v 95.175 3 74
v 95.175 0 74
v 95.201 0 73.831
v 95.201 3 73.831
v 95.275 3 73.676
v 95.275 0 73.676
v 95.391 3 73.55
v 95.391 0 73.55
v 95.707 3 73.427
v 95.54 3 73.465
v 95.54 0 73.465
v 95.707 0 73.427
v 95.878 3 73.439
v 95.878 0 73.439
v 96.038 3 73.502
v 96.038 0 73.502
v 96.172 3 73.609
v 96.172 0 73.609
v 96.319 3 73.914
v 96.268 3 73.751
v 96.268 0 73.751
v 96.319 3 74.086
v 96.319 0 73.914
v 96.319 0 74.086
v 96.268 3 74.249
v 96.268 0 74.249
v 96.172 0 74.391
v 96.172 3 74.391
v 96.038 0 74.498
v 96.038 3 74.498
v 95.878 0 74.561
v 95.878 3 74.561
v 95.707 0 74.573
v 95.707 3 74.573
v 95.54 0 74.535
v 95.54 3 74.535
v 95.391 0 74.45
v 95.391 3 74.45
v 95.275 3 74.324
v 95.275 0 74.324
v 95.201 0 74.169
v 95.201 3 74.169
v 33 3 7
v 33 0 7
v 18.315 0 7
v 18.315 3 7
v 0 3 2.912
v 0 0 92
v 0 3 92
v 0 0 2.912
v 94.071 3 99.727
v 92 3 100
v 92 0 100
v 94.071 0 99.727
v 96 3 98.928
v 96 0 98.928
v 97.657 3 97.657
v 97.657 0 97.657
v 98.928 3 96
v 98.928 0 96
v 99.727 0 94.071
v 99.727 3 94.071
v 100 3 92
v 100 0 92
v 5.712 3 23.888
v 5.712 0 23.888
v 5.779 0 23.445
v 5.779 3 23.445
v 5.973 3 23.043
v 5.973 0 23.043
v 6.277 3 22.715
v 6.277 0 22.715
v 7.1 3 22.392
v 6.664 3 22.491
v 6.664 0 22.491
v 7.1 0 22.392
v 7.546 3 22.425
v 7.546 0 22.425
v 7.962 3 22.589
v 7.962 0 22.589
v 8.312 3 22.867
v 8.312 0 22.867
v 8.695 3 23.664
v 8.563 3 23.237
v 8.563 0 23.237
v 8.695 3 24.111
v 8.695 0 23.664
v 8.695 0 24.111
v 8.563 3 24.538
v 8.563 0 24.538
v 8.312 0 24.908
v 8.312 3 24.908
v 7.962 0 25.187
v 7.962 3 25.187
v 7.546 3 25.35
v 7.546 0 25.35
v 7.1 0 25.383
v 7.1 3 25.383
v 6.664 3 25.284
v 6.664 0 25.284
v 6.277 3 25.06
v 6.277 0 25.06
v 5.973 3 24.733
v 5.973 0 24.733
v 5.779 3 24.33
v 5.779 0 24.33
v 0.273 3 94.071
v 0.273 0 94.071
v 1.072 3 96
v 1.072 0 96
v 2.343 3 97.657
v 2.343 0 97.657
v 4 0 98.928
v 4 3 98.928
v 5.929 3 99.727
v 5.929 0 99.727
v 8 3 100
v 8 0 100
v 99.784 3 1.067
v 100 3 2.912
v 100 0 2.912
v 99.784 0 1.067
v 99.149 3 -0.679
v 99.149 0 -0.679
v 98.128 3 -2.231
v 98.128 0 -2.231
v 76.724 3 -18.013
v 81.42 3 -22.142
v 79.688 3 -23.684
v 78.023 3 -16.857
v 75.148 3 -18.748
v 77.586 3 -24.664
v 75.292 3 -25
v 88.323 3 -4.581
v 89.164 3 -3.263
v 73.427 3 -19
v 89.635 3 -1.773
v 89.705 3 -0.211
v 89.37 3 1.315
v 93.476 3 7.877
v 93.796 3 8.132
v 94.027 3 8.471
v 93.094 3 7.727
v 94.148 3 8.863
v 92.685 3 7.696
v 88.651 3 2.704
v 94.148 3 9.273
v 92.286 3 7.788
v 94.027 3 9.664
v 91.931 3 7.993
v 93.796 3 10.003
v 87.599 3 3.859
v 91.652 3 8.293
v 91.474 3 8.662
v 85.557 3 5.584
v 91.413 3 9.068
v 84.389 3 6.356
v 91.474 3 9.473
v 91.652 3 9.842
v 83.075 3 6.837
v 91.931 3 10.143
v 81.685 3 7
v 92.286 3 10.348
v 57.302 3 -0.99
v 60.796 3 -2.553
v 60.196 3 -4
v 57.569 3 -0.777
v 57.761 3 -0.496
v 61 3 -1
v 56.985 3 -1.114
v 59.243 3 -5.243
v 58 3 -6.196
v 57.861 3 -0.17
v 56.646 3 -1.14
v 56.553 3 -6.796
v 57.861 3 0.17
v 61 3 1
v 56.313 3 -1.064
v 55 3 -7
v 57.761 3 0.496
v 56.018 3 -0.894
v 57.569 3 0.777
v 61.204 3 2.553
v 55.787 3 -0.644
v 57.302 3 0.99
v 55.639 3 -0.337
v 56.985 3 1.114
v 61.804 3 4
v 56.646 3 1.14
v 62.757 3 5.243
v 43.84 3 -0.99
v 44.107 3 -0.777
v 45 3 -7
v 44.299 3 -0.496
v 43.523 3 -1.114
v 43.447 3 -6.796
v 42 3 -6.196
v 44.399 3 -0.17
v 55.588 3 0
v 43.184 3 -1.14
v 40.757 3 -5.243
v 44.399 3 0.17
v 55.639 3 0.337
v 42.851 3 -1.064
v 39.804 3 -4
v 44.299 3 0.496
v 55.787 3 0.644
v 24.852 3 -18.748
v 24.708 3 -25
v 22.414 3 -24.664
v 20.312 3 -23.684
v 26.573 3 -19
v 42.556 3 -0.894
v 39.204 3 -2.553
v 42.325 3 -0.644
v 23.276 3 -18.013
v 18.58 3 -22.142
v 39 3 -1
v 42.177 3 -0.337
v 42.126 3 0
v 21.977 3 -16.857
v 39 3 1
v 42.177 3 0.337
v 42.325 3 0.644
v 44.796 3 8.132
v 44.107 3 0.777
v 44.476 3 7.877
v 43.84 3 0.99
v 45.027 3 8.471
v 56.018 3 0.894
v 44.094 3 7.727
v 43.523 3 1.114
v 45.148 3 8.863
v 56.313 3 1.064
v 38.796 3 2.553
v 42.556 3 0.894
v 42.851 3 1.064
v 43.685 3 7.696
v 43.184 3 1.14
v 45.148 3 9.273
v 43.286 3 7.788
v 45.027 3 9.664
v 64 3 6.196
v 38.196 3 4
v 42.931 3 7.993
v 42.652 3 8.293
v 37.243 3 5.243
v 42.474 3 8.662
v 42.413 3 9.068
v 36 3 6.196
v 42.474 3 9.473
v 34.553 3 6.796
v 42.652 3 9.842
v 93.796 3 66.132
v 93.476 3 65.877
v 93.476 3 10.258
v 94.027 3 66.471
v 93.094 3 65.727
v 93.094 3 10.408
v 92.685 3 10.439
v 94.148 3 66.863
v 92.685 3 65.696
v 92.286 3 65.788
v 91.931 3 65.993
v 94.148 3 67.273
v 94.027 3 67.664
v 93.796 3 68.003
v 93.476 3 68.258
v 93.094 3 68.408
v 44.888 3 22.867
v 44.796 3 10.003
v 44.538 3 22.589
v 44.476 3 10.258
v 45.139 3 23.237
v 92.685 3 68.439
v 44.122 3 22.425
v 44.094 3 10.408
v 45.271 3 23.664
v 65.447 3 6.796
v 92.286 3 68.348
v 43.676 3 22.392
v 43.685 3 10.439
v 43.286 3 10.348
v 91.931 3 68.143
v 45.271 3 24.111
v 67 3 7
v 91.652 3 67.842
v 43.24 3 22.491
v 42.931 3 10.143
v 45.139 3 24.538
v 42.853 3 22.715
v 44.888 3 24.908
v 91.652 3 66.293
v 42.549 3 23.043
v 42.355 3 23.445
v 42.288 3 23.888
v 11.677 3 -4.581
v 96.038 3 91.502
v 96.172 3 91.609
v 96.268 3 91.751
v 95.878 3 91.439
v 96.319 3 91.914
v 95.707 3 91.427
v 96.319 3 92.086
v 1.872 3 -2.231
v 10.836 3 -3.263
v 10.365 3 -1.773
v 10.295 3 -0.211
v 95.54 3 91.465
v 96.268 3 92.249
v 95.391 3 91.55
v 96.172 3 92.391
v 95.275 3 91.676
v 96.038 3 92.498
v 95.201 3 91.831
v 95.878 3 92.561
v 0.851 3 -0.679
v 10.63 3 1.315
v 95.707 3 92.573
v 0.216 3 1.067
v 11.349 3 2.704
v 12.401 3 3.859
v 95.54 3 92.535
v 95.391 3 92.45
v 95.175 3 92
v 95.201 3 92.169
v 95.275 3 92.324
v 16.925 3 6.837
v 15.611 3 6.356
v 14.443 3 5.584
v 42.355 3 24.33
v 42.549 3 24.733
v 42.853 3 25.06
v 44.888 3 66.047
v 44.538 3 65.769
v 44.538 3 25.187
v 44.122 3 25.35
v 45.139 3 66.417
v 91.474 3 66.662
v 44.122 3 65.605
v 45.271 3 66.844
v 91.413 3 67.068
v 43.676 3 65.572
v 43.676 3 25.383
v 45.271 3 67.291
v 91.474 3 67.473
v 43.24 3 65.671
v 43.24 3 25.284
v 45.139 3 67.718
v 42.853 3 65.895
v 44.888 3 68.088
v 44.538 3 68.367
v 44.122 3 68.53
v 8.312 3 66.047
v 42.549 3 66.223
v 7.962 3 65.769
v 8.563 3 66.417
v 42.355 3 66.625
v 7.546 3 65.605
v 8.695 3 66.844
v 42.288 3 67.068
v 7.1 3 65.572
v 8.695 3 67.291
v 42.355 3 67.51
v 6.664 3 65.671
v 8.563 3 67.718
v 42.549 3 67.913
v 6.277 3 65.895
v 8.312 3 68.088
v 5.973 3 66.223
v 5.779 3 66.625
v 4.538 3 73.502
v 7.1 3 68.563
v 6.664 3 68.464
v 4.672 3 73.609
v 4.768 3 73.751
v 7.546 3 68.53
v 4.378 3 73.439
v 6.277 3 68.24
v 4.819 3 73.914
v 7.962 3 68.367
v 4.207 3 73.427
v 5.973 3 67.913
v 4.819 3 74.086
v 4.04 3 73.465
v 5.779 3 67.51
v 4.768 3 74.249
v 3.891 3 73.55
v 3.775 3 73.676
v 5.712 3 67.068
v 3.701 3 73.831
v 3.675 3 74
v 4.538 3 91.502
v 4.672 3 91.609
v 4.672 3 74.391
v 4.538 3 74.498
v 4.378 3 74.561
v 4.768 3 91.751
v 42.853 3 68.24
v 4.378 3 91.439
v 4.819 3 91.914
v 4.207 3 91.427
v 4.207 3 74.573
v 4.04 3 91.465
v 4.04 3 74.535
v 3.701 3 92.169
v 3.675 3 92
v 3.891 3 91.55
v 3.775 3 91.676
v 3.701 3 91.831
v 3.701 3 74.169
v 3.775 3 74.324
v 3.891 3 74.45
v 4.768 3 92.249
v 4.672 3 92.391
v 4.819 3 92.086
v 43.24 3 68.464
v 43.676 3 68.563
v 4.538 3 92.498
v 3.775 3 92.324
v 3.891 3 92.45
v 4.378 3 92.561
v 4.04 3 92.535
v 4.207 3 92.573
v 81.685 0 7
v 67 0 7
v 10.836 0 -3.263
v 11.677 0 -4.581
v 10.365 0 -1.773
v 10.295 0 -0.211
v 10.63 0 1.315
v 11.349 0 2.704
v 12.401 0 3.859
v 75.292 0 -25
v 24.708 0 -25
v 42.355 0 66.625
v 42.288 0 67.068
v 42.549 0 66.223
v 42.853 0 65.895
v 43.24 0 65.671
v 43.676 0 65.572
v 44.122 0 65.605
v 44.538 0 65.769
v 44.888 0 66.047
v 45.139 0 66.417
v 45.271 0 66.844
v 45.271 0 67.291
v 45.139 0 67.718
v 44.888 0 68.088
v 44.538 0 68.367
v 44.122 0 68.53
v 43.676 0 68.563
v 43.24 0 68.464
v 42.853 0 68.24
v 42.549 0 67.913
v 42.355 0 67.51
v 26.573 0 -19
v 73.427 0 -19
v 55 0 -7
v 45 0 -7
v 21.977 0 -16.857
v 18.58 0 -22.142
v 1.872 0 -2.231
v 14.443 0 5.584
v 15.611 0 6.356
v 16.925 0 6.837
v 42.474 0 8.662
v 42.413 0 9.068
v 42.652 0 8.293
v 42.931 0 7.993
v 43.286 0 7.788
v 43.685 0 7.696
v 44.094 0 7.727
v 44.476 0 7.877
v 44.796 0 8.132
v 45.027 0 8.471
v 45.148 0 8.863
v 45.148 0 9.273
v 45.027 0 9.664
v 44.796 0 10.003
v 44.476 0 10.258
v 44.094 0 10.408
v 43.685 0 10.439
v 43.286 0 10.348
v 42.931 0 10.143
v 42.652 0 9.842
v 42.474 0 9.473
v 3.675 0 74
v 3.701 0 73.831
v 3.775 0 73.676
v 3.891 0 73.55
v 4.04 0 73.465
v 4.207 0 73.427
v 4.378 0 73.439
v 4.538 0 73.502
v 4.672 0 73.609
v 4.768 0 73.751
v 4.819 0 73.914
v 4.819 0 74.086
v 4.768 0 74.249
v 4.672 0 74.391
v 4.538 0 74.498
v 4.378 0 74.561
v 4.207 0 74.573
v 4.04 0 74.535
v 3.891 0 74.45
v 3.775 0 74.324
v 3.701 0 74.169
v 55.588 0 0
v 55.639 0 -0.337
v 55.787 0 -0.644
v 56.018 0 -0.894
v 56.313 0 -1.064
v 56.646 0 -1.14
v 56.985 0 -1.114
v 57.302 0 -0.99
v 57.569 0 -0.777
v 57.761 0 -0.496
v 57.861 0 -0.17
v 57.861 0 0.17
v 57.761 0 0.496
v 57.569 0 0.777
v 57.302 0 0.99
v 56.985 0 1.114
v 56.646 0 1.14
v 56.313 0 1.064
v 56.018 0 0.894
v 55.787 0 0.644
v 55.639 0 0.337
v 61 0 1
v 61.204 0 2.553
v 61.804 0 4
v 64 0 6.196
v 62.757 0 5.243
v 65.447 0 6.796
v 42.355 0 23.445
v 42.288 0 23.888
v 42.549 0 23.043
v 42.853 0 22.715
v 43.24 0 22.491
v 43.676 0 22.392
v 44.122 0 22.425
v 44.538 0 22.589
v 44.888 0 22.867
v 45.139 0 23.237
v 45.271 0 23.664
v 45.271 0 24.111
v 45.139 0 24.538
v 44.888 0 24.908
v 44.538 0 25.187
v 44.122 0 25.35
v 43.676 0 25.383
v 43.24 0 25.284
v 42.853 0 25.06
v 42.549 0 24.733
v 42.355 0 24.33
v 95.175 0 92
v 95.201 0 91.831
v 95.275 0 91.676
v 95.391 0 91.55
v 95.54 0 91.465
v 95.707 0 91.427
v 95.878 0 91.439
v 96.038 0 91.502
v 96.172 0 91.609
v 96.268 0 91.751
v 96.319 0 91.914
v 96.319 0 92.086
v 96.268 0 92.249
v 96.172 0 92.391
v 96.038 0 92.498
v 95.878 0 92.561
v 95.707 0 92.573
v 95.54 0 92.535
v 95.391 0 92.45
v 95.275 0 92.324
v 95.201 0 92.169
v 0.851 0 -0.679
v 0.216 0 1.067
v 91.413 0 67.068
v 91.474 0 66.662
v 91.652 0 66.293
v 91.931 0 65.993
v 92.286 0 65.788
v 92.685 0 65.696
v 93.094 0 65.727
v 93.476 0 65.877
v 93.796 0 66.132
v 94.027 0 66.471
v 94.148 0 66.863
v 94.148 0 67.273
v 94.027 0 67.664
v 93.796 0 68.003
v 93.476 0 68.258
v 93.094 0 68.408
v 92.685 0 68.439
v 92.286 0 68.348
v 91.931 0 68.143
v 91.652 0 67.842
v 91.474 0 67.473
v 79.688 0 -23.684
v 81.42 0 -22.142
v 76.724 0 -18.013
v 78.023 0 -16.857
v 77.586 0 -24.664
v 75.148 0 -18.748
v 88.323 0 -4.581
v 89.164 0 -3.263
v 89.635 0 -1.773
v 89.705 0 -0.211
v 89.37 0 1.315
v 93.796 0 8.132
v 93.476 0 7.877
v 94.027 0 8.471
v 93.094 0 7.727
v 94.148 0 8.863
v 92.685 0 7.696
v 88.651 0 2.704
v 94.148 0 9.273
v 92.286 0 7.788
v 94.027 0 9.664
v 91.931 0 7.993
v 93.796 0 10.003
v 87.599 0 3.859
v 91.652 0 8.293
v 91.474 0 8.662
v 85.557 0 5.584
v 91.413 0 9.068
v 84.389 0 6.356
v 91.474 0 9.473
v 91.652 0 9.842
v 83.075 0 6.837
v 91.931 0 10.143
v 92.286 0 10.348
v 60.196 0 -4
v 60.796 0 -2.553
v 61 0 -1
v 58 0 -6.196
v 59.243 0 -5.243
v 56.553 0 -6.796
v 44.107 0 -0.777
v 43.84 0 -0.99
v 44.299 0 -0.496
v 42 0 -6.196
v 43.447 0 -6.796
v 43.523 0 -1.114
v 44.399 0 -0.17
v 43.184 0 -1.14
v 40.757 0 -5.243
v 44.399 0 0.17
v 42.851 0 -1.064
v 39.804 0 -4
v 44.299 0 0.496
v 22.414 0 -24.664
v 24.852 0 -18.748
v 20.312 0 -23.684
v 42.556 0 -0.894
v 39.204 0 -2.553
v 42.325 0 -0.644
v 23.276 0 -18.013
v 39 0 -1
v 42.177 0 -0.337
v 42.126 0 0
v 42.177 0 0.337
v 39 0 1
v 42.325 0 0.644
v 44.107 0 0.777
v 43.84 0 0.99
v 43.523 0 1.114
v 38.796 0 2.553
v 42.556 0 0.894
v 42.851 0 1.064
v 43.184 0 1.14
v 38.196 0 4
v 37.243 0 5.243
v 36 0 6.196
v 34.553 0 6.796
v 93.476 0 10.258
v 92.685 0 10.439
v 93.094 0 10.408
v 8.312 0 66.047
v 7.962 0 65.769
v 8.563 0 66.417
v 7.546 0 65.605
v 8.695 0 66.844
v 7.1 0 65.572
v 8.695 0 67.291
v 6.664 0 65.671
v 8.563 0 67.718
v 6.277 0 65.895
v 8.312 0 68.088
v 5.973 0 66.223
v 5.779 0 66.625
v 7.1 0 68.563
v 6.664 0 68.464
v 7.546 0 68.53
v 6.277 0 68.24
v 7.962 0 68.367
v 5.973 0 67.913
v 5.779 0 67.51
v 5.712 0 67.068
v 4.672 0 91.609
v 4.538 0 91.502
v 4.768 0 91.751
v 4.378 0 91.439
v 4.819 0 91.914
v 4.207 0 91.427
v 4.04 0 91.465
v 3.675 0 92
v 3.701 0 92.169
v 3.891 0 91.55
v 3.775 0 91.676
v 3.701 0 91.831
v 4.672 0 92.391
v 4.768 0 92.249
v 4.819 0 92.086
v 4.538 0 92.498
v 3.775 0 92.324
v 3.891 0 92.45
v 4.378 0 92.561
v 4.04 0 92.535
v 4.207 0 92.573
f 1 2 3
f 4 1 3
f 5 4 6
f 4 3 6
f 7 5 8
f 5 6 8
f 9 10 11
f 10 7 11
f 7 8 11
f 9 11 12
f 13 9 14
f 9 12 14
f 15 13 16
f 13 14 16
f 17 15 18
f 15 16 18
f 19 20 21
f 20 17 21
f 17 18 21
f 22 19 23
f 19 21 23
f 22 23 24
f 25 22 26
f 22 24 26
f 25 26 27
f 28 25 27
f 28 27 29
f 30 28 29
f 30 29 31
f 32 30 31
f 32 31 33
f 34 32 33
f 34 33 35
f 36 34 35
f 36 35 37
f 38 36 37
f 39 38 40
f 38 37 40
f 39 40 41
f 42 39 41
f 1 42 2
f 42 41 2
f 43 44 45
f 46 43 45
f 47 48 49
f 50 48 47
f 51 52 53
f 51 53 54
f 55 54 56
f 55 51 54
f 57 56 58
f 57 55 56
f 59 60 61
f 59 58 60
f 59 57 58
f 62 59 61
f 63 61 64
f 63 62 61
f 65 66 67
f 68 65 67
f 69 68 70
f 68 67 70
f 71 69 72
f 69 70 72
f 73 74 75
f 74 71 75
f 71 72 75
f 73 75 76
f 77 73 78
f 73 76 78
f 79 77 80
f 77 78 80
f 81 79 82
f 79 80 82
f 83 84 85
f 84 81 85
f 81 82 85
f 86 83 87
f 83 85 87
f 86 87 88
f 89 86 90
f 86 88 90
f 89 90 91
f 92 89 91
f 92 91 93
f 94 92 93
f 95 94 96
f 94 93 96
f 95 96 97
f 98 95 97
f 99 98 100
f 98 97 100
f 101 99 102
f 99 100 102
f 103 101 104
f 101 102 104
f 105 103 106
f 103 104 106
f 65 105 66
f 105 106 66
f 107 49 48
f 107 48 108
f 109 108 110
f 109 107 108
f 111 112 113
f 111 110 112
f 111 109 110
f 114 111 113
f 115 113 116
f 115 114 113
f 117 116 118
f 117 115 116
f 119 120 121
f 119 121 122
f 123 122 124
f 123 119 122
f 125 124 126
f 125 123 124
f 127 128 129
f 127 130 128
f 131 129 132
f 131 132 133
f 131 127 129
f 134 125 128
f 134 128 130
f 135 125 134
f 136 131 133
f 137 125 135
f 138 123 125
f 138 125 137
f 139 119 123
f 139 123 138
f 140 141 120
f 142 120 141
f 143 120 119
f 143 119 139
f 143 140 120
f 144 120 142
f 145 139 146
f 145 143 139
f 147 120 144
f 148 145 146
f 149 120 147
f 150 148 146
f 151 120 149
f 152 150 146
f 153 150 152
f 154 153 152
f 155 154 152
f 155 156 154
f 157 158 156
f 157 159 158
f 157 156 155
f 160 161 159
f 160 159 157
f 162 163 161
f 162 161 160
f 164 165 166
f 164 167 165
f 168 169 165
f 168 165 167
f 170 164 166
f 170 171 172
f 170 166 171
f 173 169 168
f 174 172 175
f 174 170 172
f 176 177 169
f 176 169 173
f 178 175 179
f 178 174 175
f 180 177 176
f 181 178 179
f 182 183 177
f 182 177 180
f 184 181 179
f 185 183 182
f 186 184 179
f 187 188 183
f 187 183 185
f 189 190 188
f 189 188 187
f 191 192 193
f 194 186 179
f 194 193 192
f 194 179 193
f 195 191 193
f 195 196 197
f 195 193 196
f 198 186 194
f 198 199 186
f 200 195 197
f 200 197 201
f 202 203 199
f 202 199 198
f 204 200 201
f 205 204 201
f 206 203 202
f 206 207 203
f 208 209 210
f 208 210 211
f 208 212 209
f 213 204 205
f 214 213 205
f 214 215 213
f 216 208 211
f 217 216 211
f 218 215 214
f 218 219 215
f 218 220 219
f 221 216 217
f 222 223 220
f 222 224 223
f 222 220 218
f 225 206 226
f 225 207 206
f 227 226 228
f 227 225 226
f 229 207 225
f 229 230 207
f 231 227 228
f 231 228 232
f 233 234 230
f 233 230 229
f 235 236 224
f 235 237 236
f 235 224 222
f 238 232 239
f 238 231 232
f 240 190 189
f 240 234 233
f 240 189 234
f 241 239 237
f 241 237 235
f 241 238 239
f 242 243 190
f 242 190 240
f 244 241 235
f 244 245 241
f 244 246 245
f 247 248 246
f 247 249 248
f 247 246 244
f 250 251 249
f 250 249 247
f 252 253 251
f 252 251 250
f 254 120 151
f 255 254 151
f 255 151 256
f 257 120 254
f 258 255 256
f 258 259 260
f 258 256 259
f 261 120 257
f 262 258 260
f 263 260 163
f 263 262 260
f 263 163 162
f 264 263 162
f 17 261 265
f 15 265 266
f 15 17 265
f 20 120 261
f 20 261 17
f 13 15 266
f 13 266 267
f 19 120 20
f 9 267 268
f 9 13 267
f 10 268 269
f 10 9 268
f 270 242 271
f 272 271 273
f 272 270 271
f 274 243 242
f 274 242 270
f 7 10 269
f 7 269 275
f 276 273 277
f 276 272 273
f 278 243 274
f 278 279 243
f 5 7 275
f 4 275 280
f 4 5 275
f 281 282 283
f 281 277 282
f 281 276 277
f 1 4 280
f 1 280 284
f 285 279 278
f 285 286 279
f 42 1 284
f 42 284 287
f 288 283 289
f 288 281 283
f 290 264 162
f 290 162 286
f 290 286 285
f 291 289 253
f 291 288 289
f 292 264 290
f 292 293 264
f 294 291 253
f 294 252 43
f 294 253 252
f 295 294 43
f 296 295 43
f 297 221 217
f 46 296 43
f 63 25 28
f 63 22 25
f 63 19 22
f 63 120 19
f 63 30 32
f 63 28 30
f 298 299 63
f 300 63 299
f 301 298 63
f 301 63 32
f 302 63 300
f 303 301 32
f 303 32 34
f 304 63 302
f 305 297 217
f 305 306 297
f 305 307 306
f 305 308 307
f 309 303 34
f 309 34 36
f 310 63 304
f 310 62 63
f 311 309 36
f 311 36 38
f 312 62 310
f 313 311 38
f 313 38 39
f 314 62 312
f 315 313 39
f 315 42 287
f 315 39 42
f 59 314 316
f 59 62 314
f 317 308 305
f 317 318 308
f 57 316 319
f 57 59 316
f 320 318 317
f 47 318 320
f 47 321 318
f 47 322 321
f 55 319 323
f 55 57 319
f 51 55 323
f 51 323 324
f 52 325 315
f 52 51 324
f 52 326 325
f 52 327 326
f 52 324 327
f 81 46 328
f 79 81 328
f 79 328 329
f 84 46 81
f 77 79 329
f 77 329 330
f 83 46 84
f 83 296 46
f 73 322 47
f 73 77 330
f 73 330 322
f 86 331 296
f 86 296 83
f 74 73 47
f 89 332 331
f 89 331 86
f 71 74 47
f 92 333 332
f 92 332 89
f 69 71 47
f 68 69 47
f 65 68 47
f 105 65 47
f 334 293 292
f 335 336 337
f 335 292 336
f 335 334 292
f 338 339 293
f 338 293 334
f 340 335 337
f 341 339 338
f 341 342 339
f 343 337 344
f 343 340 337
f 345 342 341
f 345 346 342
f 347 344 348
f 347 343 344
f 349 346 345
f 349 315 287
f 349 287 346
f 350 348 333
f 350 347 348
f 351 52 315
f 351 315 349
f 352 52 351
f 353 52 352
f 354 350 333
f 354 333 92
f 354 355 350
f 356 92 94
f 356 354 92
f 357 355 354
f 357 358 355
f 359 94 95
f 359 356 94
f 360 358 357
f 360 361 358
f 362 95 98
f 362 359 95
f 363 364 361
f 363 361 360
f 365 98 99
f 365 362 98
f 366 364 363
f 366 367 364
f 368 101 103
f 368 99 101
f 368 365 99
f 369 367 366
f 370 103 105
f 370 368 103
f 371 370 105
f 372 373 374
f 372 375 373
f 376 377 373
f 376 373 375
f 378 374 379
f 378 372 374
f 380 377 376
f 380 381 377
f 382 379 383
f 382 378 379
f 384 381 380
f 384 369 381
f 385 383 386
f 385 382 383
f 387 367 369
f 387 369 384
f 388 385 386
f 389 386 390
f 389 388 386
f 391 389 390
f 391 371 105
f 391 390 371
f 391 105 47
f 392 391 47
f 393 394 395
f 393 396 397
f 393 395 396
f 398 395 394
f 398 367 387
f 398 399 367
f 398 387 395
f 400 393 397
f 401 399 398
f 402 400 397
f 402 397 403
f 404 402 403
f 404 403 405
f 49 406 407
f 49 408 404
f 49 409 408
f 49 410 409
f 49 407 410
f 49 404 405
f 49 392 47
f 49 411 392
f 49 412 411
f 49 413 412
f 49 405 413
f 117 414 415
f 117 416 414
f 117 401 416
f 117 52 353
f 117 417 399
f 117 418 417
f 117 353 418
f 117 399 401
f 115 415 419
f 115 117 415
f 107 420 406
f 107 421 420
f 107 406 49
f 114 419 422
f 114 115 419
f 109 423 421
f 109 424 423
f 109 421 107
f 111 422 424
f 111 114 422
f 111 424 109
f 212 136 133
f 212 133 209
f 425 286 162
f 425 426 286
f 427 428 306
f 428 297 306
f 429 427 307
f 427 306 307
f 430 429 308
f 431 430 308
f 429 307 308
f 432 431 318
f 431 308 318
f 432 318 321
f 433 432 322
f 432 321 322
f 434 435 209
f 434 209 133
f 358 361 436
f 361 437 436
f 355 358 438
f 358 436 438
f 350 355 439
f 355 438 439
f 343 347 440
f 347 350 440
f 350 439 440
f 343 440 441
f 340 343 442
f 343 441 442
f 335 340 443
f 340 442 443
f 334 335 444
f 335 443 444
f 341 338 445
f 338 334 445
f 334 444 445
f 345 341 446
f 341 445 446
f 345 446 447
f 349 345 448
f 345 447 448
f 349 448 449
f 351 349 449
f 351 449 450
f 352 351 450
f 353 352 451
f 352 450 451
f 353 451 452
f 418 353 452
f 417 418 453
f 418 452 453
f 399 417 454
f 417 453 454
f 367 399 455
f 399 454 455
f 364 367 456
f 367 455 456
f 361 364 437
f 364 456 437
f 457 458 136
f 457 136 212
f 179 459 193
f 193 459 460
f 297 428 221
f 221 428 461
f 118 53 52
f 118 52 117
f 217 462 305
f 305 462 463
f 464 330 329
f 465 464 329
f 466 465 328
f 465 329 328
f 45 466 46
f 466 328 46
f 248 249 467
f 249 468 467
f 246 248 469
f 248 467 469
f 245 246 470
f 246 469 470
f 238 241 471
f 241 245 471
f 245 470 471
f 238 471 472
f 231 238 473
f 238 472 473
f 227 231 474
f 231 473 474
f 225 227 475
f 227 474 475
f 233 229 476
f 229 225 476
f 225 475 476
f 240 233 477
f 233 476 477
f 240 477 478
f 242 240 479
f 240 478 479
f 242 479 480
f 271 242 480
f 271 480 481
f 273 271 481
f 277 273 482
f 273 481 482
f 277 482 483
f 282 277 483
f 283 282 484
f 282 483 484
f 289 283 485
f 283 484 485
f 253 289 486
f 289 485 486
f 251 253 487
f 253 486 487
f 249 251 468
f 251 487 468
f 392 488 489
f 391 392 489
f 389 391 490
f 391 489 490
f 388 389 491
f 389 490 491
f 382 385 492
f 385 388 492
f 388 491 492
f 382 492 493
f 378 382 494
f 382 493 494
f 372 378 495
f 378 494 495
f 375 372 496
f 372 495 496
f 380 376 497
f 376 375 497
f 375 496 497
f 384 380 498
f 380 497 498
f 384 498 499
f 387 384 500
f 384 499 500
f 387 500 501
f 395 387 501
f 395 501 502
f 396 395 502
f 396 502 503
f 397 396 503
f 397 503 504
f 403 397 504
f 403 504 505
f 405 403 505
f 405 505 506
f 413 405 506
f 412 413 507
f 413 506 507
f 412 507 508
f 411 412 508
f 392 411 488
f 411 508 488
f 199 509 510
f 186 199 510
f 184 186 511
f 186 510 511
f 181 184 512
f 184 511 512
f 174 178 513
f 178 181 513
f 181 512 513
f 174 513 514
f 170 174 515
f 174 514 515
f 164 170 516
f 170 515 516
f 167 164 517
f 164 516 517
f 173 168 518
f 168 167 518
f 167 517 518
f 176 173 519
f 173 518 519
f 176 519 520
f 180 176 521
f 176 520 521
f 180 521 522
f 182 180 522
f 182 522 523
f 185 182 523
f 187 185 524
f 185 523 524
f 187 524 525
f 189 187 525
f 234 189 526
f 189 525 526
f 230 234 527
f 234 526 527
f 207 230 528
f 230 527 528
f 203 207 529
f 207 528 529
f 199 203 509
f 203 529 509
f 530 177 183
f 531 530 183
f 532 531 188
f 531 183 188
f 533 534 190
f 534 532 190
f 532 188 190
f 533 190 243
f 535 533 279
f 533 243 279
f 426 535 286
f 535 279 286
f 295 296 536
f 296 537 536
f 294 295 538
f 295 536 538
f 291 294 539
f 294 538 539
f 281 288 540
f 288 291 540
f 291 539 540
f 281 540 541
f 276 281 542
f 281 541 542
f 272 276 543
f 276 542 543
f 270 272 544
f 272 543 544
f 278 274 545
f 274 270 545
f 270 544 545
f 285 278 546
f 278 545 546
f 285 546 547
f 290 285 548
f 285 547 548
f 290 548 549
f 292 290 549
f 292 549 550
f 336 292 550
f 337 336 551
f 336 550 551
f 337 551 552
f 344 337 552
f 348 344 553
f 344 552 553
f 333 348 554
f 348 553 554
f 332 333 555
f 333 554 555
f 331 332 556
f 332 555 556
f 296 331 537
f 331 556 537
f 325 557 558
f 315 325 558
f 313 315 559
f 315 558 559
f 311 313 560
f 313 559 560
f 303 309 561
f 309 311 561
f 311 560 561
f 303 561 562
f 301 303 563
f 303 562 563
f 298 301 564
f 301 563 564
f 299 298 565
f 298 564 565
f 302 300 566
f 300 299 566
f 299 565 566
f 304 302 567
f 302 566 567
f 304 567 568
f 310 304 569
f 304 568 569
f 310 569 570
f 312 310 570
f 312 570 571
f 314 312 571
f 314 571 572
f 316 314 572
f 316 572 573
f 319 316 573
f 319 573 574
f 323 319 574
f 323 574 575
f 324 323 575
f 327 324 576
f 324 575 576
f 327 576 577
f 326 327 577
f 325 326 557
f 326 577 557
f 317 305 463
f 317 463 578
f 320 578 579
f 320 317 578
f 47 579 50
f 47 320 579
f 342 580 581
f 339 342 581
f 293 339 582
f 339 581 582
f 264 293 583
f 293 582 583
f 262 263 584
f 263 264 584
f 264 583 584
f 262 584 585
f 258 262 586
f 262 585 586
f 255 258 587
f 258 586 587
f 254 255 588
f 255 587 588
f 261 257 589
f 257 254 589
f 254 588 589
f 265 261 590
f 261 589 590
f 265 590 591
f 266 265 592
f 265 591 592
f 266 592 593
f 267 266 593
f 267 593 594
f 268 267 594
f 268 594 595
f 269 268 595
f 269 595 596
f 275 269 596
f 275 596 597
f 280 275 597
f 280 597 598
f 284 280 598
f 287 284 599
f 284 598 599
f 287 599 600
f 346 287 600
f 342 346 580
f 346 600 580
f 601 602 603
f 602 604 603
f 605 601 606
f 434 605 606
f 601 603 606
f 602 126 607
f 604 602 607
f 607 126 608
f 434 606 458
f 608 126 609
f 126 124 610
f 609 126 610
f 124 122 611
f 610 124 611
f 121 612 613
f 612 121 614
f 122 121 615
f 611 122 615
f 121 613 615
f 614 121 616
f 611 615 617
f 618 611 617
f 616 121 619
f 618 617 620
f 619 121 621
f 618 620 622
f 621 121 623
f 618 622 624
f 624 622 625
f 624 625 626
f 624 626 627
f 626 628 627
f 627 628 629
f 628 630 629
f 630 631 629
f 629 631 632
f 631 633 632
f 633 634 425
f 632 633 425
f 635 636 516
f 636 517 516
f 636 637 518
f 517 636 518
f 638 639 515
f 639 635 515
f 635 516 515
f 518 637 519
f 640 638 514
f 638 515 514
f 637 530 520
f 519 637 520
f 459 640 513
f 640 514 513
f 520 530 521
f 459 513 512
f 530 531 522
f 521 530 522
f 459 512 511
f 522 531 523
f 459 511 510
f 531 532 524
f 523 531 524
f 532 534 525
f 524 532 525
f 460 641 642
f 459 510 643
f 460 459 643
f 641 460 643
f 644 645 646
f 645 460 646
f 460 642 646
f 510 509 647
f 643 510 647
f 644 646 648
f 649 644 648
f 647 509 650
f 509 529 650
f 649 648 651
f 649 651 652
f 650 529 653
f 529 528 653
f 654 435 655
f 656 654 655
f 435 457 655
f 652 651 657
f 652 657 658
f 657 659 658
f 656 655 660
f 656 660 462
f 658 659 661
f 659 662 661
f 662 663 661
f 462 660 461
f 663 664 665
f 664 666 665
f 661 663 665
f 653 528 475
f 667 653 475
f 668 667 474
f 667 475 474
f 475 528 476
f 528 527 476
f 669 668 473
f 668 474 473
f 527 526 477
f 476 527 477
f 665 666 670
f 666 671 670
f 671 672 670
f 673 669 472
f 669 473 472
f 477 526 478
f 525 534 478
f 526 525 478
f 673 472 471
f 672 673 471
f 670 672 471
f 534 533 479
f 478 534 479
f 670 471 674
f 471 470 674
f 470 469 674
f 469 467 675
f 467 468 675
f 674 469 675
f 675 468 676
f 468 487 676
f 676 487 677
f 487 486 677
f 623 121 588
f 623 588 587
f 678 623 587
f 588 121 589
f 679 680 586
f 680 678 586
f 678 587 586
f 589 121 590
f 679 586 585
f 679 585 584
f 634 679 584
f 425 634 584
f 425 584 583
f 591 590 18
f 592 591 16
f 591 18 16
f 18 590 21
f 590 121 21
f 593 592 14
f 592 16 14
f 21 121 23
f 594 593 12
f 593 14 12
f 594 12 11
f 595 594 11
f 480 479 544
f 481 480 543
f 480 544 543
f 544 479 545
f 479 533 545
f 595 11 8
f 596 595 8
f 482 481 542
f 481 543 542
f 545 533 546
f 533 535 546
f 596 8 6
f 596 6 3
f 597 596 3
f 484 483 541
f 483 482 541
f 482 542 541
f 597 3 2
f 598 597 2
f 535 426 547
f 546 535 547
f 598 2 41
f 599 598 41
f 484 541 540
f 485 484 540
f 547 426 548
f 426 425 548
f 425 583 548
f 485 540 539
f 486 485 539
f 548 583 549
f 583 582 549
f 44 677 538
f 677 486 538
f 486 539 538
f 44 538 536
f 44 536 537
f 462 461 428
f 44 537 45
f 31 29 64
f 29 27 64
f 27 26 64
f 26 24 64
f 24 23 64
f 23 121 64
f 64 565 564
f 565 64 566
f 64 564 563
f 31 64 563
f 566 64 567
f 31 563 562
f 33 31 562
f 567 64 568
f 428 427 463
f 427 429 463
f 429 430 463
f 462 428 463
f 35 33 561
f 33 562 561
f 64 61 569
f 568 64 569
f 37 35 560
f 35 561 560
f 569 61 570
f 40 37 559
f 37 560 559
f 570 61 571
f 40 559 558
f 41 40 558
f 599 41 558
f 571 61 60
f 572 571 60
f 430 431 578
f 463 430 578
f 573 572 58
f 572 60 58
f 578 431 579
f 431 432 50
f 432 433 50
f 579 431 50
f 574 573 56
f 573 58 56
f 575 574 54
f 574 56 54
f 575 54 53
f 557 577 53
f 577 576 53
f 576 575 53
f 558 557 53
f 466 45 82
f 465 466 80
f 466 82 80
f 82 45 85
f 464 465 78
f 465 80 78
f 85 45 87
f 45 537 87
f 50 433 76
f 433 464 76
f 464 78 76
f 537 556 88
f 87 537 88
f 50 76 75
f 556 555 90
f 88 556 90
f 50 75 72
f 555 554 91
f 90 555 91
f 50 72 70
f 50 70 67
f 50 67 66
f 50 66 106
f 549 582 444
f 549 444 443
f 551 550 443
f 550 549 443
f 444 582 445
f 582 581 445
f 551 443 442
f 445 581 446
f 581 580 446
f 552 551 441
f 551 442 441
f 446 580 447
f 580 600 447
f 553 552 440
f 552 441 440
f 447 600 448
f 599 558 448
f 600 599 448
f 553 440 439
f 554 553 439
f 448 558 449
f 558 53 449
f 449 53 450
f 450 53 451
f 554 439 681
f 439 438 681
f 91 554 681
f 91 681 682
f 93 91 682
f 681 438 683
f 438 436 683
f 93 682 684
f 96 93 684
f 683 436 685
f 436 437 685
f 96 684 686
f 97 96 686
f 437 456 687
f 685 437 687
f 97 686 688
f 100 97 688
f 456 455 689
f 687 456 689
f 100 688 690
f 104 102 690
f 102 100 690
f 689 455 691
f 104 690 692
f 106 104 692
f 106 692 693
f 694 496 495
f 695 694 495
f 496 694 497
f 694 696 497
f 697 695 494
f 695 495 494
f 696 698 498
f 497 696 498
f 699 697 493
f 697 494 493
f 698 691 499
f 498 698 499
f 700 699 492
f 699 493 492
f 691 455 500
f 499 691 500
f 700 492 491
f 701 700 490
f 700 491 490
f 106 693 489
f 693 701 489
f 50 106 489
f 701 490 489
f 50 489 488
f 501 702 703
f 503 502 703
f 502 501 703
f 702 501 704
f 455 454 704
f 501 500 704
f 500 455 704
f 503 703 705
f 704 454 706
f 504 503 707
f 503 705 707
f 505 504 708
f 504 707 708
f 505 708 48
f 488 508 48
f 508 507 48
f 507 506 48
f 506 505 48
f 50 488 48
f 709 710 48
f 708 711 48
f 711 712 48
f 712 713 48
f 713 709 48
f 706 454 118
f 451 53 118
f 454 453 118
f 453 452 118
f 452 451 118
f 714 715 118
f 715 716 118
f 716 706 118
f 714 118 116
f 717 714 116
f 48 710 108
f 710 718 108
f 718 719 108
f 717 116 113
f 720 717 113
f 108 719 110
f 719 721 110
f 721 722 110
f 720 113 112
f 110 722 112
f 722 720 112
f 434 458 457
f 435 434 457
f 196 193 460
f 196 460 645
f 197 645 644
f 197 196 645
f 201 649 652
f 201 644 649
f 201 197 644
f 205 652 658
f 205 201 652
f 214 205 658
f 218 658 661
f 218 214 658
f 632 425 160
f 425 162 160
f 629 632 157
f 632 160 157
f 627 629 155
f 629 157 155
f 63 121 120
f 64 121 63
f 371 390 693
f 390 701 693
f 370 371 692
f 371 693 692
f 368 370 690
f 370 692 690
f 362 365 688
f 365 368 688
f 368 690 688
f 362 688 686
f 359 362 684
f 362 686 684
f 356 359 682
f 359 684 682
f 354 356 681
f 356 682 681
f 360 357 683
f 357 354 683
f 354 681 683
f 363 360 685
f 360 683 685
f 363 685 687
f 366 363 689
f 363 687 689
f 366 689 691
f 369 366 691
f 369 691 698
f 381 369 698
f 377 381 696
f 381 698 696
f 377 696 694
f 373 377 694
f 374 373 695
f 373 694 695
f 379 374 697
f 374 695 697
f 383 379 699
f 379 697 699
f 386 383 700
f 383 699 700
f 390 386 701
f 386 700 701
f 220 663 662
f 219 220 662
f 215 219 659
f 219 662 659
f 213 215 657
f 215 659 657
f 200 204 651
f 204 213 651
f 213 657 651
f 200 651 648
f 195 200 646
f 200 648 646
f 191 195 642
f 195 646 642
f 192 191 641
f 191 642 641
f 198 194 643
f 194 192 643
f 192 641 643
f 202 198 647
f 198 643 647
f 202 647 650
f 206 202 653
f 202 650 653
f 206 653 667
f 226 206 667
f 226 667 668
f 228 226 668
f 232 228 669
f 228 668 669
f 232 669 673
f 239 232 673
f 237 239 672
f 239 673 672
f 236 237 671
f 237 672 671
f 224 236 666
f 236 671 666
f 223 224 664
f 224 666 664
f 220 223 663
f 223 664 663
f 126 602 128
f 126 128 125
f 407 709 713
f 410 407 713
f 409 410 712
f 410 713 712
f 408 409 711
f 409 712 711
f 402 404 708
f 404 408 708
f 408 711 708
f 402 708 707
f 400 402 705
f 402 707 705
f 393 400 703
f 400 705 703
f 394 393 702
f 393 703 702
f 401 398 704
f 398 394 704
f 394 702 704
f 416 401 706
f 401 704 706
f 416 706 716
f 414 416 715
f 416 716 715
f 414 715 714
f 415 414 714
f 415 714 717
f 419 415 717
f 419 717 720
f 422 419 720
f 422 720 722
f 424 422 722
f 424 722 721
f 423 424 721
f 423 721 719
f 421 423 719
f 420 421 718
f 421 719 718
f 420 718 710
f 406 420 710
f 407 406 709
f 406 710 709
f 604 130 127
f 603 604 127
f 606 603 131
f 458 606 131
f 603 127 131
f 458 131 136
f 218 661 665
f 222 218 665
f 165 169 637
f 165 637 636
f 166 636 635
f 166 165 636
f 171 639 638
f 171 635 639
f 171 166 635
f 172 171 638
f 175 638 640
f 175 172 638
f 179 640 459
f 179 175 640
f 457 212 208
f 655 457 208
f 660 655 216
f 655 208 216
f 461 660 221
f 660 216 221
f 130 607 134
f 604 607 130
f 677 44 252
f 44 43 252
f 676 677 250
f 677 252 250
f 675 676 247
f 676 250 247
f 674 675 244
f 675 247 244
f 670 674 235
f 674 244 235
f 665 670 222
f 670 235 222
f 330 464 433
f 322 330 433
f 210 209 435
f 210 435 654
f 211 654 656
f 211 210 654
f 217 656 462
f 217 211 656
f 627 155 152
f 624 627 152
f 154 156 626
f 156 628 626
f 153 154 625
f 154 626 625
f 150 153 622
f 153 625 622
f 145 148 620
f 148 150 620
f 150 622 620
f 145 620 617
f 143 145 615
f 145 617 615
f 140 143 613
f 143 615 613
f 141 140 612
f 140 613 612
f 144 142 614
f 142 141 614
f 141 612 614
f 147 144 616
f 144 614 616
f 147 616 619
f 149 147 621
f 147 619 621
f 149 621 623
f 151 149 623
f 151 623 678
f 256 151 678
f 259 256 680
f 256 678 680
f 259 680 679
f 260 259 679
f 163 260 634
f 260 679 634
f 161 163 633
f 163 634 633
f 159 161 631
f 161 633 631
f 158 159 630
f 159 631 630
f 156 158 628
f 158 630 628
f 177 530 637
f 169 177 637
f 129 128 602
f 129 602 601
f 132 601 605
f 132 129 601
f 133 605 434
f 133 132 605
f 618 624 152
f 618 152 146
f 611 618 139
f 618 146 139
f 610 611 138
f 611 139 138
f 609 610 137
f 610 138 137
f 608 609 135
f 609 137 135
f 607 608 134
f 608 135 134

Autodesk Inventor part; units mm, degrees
ref_plane "YZ Plane" through (0, 0, 0) normal (1, 0, 0) x (0, 1, 0)
ref_plane "XZ Plane" through (0, 0, 0) normal (0, 1, 0) x (-1, 0, 0)
ref_plane "XY Plane" through (0, 0, 0) normal (0, 0, 1) x (1, 0, 0)
sketch "Sketch1" plane through (0, 0, 0) normal (0, 1, 0) x (-1, 0, 0)
  line L0 (0, 0) -> (-100, 0) construction
  line L1 (-100, 0) -> (-100, 100)
  line L2 (-100, 100) -> (0, 100)
  line L3 (0, 100) -> (0, 0)
  circle A0 centre (-4.25, 92) radius 0.575
  circle A1 centre (-4.25, 74) radius 0.575
  line L4 (-50, 100) -> (-50, 0) construction
  line L5 (-7.212, 23.8876) -> (-7.212, 67.0676) construction
  line L6 (-7.212, 67.0676) -> (-43.788, 67.0676) construction
  line L7 (-7.212, 23.8876) -> (-43.788, 23.8876) construction
  circle A2 centre (-7.212, 67.0676) radius 1.5
  circle A3 centre (-43.788, 67.0676) radius 1.5
  circle A4 centre (-7.212, 23.8876) radius 1.5
  circle A5 centre (-43.788, 23.8876) radius 1.5
  line L8 (-43.788, 9.0676) -> (-92.788, 9.0676) construction
  line L9 (-92.788, 9.0676) -> (-92.788, 67.0676) construction
  line L10 (-92.788, 67.0676) -> (-43.788, 67.0676) construction
  line L11 (-43.788, 67.0676) -> (-43.788, 9.0676) construction
  circle A6 centre (-43.788, 9.0676) radius 1.375
  circle A7 centre (-92.788, 9.0676) radius 1.375
  circle A8 centre (-92.788, 67.0676) radius 1.375
  circle A9 centre (-43.788, 67.0676) radius 1.375
  line L12 (-7.212, 45.4776) -> (0, 45.4776) construction
  line L13 (-92.788, 38.0676) -> (-100, 38.0676) construction
  circle A10 centre (-43.269, 0) radius 1.143
  line L14 (0, 0) -> (-100, 0) construction
  circle A11 centre (-95.75, 74) radius 0.575
  circle A12 centre (-56.731, 0) radius 1.143
  circle A13 centre (-95.75, 92) radius 0.575
  line L15 (-39, 7) -> (-61, 7)
  line L16 (-61, 7) -> (-61, -7)
  line L17 (-61, -7) -> (-39, -7)
  line L18 (-39, -7) -> (-39, 7)
  line L19 (-39, 7) -> (-61, -7) construction
  line L20 (-61, 7) -> (-39, -7) construction
  line L21 (-50, 0) -> (-50, -25) construction
  line L22 (-50, -25) -> (-20.9775, -25)
  line L23 (-20.9775, -25) -> (0, 0)
  line L24 (-7.8324, 0) -> (-23.7753, -19)
  line L25 (-23.7753, -19) -> (-50, -19)
  line L26 (-39, 7) -> (-16.1201, 7)
  line L27 (-16.1201, 7) -> (-7.8324, 0)
  line L28 (-50, -25) -> (-79.0225, -25)
  line L29 (-79.0225, -25) -> (-100, 0)
  line L30 (-92.1676, 0) -> (-76.2247, -19)
  line L31 (-76.2247, -19) -> (-50, -19)
  line L32 (-61, 7) -> (-83.8799, 7)
  line L33 (-83.8799, 7) -> (-92.1676, 0)
  line L34 (-30, 100) -> (-70, 100)
  point P0 (-50, 80)
  dimension "d0" = 100
  dimension "d1" = 100
  dimension "d2" = 8
  dimension "d3" = 4.25
  dimension "d4" = 1.15
  dimension "d5" = 18
  dimension "d6" = 43.18
  dimension "d7" = 36.576
  dimension "d8" = 3
  dimension "d9" = 49
  dimension "d10" = 58
  dimension "d15" = 2.75
  dimension "d16" = 13.462
  dimension "d17" = 2.286
  dimension "d33" = 22
  dimension "d34" = 25
  dimension "d36" = 130
  dimension "d37" = 6
  dimension "d38" = 6
  dimension "d39" = 14
extrude "Extrusion1" add sketch "Sketch1" along normal blind 3 contours L1 L2 L3 L23 L22 L28 L29 | L18 L17 L16 L15
fillet "Fillet1" radius 6 10 edges at (61, 1.5, 7) (39, 1.5, 7) (39, 1.5, -7) (61, 1.5, -7) (7.8324, 1.5, 0) (92.1676, 1.5, 0) (83.8799, 1.5, 7) (16.1201, 1.5, 7) (23.7753, 1.5, -19) (76.2247, 1.5, -19)
fillet "Fillet1" radius 8 6 edges at (20.9775, 1.5, -25) (0, 1.5, 0) (79.0225, 1.5, -25) (100, 1.5, 0) (100, 1.5, 100) (0, 1.5, 100)
properties part number "ROBOT CHASSIS PLATE"
